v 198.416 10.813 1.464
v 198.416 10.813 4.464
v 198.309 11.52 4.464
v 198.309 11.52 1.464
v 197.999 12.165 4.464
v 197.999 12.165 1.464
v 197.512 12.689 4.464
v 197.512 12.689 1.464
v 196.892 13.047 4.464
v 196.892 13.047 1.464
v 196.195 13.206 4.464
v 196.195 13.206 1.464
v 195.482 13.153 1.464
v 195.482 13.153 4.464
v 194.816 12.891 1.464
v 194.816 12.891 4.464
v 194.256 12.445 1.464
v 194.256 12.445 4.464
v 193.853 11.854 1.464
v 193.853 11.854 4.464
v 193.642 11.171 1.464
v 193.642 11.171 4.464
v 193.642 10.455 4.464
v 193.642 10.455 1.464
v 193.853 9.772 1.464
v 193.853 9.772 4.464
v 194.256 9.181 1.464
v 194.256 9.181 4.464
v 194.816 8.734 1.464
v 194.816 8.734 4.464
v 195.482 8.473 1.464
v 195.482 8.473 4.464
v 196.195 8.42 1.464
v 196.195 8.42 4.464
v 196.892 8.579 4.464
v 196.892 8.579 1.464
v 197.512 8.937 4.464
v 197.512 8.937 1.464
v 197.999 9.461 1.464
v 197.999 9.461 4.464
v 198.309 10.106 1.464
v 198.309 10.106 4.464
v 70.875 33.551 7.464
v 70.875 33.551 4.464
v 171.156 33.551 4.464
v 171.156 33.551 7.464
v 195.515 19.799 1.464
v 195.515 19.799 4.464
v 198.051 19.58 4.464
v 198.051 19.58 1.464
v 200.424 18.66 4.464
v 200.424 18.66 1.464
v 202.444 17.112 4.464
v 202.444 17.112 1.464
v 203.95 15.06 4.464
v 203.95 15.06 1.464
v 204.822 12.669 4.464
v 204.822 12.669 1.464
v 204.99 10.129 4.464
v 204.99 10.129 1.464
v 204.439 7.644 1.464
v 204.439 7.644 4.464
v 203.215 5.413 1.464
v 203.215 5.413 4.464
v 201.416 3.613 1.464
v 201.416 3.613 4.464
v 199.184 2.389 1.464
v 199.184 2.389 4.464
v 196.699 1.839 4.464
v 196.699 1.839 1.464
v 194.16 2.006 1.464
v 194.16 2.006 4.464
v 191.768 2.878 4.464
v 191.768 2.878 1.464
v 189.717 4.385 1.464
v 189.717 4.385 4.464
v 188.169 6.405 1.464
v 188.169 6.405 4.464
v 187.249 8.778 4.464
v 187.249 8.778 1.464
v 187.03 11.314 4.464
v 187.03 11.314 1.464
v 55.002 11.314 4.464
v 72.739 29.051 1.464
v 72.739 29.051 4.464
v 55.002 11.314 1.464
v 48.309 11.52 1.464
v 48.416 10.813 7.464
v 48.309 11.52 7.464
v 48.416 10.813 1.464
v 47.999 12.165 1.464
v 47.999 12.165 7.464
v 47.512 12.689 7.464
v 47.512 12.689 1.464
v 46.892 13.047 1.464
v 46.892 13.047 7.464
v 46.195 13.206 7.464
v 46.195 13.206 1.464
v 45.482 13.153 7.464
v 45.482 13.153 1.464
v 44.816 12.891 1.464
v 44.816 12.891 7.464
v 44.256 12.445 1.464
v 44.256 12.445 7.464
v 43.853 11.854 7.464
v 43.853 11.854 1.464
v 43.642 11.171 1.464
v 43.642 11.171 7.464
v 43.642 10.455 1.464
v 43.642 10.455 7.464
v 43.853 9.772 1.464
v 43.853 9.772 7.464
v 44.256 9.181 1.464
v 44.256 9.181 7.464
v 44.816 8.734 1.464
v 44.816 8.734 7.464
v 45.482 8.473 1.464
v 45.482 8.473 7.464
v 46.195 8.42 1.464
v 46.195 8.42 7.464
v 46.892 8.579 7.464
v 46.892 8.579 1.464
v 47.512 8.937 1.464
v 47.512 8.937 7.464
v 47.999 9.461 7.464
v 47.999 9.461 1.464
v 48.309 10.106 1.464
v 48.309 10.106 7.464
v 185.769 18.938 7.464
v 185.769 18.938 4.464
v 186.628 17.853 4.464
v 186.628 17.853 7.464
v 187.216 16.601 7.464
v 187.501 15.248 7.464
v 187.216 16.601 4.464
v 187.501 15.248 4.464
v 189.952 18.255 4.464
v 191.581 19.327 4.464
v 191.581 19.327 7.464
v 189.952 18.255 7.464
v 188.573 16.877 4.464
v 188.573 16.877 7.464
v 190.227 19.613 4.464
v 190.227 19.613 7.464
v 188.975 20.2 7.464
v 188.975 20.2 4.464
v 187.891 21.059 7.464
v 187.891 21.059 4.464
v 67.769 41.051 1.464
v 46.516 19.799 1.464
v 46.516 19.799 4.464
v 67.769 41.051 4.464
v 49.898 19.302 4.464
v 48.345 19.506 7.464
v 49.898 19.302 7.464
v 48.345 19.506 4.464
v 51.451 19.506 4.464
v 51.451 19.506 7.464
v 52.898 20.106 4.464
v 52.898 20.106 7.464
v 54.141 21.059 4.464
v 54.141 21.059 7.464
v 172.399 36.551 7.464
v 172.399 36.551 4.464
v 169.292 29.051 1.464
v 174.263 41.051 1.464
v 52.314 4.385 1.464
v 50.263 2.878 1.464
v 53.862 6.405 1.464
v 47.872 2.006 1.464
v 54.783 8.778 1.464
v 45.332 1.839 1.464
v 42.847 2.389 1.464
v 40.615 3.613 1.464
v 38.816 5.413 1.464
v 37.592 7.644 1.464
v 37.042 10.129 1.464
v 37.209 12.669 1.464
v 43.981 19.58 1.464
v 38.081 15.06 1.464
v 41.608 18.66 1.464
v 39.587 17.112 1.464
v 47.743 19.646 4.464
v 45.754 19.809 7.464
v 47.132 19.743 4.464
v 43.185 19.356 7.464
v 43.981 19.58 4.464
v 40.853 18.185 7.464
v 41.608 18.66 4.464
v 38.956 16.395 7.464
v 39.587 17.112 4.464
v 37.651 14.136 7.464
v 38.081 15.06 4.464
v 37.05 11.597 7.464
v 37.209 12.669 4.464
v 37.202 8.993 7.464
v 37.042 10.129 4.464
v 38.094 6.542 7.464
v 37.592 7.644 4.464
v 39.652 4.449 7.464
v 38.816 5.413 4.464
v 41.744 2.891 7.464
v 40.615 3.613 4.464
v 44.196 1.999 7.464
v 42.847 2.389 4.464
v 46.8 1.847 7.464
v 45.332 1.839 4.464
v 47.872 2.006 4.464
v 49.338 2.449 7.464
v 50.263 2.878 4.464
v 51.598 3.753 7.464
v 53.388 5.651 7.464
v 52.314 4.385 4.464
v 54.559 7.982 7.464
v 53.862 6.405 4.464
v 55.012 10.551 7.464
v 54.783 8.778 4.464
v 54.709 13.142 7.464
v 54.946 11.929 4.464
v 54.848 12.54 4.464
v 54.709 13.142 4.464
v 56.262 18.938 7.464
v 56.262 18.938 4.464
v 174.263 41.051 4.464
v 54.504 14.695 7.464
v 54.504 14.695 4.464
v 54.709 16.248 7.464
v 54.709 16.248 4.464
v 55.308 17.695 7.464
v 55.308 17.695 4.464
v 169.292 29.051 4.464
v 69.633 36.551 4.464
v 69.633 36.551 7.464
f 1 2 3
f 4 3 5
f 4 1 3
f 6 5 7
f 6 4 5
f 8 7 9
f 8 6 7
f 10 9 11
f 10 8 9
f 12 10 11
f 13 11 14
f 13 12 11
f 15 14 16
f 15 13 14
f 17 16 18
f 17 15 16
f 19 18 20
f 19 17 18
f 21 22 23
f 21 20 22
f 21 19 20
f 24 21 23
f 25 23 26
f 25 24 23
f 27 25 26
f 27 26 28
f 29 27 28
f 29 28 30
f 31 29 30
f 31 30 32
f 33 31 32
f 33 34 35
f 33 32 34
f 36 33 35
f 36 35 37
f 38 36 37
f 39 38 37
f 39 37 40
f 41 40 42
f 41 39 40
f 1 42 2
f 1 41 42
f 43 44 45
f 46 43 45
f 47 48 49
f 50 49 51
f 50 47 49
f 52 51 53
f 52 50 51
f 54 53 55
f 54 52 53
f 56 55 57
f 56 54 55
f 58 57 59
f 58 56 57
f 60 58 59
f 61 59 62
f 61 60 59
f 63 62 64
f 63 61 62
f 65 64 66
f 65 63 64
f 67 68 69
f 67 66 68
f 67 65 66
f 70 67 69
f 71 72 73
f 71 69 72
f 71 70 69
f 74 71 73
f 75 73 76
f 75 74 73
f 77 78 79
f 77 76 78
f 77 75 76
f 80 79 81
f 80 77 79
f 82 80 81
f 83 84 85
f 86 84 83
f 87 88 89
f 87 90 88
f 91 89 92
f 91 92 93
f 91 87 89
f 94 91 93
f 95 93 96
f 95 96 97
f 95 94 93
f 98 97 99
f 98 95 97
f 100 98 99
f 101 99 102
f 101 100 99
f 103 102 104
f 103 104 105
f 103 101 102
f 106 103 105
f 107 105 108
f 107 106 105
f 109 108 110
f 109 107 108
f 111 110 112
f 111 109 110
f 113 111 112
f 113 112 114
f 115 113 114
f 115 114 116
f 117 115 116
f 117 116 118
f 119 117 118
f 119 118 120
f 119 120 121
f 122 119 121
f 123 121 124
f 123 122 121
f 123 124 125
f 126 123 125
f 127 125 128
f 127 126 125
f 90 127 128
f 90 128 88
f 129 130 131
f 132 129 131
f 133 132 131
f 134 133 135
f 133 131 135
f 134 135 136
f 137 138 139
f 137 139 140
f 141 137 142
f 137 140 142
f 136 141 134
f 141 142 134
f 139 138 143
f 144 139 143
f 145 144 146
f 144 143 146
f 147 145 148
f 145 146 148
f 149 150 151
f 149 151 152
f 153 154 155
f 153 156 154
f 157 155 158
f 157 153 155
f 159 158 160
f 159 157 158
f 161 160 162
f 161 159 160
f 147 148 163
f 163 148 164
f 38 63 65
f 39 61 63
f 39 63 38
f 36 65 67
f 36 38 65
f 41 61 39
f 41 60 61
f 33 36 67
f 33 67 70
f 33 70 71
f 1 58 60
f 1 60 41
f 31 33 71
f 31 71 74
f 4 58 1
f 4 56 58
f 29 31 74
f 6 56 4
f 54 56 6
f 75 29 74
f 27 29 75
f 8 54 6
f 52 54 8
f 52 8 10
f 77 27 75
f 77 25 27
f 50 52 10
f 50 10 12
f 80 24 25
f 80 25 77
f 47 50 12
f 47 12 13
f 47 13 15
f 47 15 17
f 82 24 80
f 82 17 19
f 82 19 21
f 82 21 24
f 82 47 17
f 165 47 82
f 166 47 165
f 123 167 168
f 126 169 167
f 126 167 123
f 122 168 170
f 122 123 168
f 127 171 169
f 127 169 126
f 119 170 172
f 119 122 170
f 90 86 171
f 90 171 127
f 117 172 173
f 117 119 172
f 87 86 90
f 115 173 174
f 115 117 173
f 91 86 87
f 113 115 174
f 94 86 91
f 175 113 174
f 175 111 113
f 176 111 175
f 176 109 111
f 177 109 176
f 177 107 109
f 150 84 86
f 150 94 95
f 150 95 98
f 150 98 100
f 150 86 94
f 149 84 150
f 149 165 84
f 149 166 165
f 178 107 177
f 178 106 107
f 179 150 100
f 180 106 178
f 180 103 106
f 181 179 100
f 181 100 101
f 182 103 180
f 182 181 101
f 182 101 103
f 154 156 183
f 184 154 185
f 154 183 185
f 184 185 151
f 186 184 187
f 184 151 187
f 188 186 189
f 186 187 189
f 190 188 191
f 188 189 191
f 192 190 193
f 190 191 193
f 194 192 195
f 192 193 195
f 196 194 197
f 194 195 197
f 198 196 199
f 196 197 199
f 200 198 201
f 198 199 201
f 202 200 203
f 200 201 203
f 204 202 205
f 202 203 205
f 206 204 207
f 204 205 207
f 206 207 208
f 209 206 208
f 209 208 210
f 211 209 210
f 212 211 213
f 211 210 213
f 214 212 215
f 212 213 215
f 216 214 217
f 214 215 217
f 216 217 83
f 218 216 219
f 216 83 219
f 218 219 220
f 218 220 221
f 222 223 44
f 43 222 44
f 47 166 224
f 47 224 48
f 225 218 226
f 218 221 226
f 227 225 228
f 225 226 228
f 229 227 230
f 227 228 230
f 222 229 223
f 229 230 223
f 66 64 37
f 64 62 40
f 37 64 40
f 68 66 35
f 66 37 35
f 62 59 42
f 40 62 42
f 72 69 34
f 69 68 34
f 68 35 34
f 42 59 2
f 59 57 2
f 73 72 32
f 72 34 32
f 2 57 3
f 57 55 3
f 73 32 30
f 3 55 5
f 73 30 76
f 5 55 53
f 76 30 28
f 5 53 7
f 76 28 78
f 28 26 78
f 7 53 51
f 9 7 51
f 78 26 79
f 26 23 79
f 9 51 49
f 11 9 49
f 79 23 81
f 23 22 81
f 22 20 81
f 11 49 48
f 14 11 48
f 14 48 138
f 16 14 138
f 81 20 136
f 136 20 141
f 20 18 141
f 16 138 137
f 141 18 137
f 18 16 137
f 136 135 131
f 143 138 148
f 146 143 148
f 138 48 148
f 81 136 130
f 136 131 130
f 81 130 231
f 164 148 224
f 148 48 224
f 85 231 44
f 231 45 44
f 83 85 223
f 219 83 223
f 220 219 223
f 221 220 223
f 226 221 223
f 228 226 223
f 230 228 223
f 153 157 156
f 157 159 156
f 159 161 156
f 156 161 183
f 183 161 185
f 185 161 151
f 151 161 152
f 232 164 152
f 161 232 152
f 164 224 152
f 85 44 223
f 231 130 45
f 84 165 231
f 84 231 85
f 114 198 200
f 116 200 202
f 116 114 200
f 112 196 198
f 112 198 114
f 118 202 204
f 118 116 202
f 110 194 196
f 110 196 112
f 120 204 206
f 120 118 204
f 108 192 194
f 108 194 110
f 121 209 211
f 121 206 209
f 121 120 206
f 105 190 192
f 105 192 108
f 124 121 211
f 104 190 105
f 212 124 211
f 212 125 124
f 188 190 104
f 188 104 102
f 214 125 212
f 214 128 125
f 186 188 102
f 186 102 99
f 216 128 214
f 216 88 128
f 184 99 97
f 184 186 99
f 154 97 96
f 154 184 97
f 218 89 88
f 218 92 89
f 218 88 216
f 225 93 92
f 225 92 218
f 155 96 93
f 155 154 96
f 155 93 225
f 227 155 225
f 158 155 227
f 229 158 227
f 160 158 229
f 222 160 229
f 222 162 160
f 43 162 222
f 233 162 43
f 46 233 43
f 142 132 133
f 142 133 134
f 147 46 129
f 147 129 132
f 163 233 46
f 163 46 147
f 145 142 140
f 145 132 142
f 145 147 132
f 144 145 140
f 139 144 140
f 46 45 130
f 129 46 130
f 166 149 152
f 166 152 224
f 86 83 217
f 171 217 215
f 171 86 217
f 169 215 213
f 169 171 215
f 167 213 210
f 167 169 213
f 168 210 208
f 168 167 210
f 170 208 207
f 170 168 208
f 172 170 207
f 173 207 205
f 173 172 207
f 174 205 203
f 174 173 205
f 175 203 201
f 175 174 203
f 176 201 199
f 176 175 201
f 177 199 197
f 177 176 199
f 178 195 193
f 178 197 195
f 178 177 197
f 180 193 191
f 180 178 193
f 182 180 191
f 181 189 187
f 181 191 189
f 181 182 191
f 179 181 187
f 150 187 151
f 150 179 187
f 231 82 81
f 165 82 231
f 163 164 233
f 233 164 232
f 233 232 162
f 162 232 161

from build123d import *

# Parameters (mm, degrees)
SKETCH1_R             = 4
BOSS_EXTRUDE1_DEPTH   = 5
BOSS_EXTRUDE2_DEPTH   = 5
SKETCH7_R             = 15
SKETCH7_R_2           = 4
BOSS_EXTRUDE3_DEPTH   = 5
FILLET1_R             = 10
IZIM1_R               = 16
KES_EKSTR_ZYON1_DEPTH = 5
ECHELLE1_SCALE        = 0.6


with BuildPart() as part:
    # Sketch1 → Boss-Extrude1 (new body)
    with BuildSketch(Plane.XY):
        with BuildLine():
            Line((44.539250231, 30.397114607), (14.976761962, 0.834626339))
            ThreePointArc((14.976761962, 0.834626339), (-10.606601718, -10.606601718), (0.834626339, 14.976761962))
            Line((0.834626339, 14.976761962), (36.254978983, 50.397114607))
            Line((36.254978983, 50.397114607), (213.745021017, 50.397114607))
            Line((213.745021017, 50.397114607), (249.165373661, 14.976761962))
            ThreePointArc((249.165373661, 14.976761962), (260.606601718, -10.606601718), (235.023238038, 0.834626339))
            Line((235.023238038, 0.834626339), (205.460749769, 30.397114607))
            Line((205.460749769, 30.397114607), (44.539250231, 30.397114607))
        make_face()
        Circle(SKETCH1_R, mode=Mode.SUBTRACT)
        with Locations((250, 0)):
            Circle(SKETCH1_R, mode=Mode.SUBTRACT)
    extrude(amount=BOSS_EXTRUDE1_DEPTH)

    # Sketch6 → Boss-Extrude2 (add)
    with BuildSketch(Plane.XY.offset(5)):
        Polygon((243.862072803, 9.673461103), (210.638419299, 42.897114607), (39.361580701, 42.897114607), (6.137927197, 9.673461103), (9.673461103, 6.137927197), (41.432648513, 37.897114607), (208.567351487, 37.897114607), (240.326538897, 6.137927197), align=None)
    extrude(amount=BOSS_EXTRUDE2_DEPTH)

    # Sketch7 → Boss-Extrude3 (add)
    # profile 1 of 2: a face of its own
    with BuildSketch(Plane.XY.offset(5)):
        Circle(SKETCH7_R)
        Circle(SKETCH7_R_2, mode=Mode.SUBTRACT)
    # profile 2 of 2: a face of its own
    with BuildSketch(Plane.XY.offset(5)):
        with Locations((250, 0)):
            Circle(SKETCH7_R)
        with Locations((250, 0)):
            Circle(SKETCH7_R_2, mode=Mode.SUBTRACT)
    extrude(amount=BOSS_EXTRUDE3_DEPTH)

    # Fillet1
    fillet1_edges = [part.edges().sort_by_distance(p)[0] for p in [
        (8.690483379, 12.226017285, 7.5),
        (12.226017285, 8.690483379, 7.5),
        (241.309516621, 12.226017285, 7.5),
        (237.773982715, 8.690483379, 7.5),
    ]]
    fillet(fillet1_edges, radius=FILLET1_R)

    # izim1 → Kes-Ekstr_zyon1 (cut)
    with BuildSketch(Plane.XY.offset(10)):
        with Locations((250, 0)):
            Circle(IZIM1_R)
    extrude(amount=-KES_EKSTR_ZYON1_DEPTH, mode=Mode.SUBTRACT)


with BuildPart() as part_1:
    # Echelle1: scaled about (115.03902324, 27.032288503, 3.659762747)
    add(part.part.scale(ECHELLE1_SCALE).moved(Location((46.015609296, 10.812915401, 1.463905099))))


solid = part_1.part
